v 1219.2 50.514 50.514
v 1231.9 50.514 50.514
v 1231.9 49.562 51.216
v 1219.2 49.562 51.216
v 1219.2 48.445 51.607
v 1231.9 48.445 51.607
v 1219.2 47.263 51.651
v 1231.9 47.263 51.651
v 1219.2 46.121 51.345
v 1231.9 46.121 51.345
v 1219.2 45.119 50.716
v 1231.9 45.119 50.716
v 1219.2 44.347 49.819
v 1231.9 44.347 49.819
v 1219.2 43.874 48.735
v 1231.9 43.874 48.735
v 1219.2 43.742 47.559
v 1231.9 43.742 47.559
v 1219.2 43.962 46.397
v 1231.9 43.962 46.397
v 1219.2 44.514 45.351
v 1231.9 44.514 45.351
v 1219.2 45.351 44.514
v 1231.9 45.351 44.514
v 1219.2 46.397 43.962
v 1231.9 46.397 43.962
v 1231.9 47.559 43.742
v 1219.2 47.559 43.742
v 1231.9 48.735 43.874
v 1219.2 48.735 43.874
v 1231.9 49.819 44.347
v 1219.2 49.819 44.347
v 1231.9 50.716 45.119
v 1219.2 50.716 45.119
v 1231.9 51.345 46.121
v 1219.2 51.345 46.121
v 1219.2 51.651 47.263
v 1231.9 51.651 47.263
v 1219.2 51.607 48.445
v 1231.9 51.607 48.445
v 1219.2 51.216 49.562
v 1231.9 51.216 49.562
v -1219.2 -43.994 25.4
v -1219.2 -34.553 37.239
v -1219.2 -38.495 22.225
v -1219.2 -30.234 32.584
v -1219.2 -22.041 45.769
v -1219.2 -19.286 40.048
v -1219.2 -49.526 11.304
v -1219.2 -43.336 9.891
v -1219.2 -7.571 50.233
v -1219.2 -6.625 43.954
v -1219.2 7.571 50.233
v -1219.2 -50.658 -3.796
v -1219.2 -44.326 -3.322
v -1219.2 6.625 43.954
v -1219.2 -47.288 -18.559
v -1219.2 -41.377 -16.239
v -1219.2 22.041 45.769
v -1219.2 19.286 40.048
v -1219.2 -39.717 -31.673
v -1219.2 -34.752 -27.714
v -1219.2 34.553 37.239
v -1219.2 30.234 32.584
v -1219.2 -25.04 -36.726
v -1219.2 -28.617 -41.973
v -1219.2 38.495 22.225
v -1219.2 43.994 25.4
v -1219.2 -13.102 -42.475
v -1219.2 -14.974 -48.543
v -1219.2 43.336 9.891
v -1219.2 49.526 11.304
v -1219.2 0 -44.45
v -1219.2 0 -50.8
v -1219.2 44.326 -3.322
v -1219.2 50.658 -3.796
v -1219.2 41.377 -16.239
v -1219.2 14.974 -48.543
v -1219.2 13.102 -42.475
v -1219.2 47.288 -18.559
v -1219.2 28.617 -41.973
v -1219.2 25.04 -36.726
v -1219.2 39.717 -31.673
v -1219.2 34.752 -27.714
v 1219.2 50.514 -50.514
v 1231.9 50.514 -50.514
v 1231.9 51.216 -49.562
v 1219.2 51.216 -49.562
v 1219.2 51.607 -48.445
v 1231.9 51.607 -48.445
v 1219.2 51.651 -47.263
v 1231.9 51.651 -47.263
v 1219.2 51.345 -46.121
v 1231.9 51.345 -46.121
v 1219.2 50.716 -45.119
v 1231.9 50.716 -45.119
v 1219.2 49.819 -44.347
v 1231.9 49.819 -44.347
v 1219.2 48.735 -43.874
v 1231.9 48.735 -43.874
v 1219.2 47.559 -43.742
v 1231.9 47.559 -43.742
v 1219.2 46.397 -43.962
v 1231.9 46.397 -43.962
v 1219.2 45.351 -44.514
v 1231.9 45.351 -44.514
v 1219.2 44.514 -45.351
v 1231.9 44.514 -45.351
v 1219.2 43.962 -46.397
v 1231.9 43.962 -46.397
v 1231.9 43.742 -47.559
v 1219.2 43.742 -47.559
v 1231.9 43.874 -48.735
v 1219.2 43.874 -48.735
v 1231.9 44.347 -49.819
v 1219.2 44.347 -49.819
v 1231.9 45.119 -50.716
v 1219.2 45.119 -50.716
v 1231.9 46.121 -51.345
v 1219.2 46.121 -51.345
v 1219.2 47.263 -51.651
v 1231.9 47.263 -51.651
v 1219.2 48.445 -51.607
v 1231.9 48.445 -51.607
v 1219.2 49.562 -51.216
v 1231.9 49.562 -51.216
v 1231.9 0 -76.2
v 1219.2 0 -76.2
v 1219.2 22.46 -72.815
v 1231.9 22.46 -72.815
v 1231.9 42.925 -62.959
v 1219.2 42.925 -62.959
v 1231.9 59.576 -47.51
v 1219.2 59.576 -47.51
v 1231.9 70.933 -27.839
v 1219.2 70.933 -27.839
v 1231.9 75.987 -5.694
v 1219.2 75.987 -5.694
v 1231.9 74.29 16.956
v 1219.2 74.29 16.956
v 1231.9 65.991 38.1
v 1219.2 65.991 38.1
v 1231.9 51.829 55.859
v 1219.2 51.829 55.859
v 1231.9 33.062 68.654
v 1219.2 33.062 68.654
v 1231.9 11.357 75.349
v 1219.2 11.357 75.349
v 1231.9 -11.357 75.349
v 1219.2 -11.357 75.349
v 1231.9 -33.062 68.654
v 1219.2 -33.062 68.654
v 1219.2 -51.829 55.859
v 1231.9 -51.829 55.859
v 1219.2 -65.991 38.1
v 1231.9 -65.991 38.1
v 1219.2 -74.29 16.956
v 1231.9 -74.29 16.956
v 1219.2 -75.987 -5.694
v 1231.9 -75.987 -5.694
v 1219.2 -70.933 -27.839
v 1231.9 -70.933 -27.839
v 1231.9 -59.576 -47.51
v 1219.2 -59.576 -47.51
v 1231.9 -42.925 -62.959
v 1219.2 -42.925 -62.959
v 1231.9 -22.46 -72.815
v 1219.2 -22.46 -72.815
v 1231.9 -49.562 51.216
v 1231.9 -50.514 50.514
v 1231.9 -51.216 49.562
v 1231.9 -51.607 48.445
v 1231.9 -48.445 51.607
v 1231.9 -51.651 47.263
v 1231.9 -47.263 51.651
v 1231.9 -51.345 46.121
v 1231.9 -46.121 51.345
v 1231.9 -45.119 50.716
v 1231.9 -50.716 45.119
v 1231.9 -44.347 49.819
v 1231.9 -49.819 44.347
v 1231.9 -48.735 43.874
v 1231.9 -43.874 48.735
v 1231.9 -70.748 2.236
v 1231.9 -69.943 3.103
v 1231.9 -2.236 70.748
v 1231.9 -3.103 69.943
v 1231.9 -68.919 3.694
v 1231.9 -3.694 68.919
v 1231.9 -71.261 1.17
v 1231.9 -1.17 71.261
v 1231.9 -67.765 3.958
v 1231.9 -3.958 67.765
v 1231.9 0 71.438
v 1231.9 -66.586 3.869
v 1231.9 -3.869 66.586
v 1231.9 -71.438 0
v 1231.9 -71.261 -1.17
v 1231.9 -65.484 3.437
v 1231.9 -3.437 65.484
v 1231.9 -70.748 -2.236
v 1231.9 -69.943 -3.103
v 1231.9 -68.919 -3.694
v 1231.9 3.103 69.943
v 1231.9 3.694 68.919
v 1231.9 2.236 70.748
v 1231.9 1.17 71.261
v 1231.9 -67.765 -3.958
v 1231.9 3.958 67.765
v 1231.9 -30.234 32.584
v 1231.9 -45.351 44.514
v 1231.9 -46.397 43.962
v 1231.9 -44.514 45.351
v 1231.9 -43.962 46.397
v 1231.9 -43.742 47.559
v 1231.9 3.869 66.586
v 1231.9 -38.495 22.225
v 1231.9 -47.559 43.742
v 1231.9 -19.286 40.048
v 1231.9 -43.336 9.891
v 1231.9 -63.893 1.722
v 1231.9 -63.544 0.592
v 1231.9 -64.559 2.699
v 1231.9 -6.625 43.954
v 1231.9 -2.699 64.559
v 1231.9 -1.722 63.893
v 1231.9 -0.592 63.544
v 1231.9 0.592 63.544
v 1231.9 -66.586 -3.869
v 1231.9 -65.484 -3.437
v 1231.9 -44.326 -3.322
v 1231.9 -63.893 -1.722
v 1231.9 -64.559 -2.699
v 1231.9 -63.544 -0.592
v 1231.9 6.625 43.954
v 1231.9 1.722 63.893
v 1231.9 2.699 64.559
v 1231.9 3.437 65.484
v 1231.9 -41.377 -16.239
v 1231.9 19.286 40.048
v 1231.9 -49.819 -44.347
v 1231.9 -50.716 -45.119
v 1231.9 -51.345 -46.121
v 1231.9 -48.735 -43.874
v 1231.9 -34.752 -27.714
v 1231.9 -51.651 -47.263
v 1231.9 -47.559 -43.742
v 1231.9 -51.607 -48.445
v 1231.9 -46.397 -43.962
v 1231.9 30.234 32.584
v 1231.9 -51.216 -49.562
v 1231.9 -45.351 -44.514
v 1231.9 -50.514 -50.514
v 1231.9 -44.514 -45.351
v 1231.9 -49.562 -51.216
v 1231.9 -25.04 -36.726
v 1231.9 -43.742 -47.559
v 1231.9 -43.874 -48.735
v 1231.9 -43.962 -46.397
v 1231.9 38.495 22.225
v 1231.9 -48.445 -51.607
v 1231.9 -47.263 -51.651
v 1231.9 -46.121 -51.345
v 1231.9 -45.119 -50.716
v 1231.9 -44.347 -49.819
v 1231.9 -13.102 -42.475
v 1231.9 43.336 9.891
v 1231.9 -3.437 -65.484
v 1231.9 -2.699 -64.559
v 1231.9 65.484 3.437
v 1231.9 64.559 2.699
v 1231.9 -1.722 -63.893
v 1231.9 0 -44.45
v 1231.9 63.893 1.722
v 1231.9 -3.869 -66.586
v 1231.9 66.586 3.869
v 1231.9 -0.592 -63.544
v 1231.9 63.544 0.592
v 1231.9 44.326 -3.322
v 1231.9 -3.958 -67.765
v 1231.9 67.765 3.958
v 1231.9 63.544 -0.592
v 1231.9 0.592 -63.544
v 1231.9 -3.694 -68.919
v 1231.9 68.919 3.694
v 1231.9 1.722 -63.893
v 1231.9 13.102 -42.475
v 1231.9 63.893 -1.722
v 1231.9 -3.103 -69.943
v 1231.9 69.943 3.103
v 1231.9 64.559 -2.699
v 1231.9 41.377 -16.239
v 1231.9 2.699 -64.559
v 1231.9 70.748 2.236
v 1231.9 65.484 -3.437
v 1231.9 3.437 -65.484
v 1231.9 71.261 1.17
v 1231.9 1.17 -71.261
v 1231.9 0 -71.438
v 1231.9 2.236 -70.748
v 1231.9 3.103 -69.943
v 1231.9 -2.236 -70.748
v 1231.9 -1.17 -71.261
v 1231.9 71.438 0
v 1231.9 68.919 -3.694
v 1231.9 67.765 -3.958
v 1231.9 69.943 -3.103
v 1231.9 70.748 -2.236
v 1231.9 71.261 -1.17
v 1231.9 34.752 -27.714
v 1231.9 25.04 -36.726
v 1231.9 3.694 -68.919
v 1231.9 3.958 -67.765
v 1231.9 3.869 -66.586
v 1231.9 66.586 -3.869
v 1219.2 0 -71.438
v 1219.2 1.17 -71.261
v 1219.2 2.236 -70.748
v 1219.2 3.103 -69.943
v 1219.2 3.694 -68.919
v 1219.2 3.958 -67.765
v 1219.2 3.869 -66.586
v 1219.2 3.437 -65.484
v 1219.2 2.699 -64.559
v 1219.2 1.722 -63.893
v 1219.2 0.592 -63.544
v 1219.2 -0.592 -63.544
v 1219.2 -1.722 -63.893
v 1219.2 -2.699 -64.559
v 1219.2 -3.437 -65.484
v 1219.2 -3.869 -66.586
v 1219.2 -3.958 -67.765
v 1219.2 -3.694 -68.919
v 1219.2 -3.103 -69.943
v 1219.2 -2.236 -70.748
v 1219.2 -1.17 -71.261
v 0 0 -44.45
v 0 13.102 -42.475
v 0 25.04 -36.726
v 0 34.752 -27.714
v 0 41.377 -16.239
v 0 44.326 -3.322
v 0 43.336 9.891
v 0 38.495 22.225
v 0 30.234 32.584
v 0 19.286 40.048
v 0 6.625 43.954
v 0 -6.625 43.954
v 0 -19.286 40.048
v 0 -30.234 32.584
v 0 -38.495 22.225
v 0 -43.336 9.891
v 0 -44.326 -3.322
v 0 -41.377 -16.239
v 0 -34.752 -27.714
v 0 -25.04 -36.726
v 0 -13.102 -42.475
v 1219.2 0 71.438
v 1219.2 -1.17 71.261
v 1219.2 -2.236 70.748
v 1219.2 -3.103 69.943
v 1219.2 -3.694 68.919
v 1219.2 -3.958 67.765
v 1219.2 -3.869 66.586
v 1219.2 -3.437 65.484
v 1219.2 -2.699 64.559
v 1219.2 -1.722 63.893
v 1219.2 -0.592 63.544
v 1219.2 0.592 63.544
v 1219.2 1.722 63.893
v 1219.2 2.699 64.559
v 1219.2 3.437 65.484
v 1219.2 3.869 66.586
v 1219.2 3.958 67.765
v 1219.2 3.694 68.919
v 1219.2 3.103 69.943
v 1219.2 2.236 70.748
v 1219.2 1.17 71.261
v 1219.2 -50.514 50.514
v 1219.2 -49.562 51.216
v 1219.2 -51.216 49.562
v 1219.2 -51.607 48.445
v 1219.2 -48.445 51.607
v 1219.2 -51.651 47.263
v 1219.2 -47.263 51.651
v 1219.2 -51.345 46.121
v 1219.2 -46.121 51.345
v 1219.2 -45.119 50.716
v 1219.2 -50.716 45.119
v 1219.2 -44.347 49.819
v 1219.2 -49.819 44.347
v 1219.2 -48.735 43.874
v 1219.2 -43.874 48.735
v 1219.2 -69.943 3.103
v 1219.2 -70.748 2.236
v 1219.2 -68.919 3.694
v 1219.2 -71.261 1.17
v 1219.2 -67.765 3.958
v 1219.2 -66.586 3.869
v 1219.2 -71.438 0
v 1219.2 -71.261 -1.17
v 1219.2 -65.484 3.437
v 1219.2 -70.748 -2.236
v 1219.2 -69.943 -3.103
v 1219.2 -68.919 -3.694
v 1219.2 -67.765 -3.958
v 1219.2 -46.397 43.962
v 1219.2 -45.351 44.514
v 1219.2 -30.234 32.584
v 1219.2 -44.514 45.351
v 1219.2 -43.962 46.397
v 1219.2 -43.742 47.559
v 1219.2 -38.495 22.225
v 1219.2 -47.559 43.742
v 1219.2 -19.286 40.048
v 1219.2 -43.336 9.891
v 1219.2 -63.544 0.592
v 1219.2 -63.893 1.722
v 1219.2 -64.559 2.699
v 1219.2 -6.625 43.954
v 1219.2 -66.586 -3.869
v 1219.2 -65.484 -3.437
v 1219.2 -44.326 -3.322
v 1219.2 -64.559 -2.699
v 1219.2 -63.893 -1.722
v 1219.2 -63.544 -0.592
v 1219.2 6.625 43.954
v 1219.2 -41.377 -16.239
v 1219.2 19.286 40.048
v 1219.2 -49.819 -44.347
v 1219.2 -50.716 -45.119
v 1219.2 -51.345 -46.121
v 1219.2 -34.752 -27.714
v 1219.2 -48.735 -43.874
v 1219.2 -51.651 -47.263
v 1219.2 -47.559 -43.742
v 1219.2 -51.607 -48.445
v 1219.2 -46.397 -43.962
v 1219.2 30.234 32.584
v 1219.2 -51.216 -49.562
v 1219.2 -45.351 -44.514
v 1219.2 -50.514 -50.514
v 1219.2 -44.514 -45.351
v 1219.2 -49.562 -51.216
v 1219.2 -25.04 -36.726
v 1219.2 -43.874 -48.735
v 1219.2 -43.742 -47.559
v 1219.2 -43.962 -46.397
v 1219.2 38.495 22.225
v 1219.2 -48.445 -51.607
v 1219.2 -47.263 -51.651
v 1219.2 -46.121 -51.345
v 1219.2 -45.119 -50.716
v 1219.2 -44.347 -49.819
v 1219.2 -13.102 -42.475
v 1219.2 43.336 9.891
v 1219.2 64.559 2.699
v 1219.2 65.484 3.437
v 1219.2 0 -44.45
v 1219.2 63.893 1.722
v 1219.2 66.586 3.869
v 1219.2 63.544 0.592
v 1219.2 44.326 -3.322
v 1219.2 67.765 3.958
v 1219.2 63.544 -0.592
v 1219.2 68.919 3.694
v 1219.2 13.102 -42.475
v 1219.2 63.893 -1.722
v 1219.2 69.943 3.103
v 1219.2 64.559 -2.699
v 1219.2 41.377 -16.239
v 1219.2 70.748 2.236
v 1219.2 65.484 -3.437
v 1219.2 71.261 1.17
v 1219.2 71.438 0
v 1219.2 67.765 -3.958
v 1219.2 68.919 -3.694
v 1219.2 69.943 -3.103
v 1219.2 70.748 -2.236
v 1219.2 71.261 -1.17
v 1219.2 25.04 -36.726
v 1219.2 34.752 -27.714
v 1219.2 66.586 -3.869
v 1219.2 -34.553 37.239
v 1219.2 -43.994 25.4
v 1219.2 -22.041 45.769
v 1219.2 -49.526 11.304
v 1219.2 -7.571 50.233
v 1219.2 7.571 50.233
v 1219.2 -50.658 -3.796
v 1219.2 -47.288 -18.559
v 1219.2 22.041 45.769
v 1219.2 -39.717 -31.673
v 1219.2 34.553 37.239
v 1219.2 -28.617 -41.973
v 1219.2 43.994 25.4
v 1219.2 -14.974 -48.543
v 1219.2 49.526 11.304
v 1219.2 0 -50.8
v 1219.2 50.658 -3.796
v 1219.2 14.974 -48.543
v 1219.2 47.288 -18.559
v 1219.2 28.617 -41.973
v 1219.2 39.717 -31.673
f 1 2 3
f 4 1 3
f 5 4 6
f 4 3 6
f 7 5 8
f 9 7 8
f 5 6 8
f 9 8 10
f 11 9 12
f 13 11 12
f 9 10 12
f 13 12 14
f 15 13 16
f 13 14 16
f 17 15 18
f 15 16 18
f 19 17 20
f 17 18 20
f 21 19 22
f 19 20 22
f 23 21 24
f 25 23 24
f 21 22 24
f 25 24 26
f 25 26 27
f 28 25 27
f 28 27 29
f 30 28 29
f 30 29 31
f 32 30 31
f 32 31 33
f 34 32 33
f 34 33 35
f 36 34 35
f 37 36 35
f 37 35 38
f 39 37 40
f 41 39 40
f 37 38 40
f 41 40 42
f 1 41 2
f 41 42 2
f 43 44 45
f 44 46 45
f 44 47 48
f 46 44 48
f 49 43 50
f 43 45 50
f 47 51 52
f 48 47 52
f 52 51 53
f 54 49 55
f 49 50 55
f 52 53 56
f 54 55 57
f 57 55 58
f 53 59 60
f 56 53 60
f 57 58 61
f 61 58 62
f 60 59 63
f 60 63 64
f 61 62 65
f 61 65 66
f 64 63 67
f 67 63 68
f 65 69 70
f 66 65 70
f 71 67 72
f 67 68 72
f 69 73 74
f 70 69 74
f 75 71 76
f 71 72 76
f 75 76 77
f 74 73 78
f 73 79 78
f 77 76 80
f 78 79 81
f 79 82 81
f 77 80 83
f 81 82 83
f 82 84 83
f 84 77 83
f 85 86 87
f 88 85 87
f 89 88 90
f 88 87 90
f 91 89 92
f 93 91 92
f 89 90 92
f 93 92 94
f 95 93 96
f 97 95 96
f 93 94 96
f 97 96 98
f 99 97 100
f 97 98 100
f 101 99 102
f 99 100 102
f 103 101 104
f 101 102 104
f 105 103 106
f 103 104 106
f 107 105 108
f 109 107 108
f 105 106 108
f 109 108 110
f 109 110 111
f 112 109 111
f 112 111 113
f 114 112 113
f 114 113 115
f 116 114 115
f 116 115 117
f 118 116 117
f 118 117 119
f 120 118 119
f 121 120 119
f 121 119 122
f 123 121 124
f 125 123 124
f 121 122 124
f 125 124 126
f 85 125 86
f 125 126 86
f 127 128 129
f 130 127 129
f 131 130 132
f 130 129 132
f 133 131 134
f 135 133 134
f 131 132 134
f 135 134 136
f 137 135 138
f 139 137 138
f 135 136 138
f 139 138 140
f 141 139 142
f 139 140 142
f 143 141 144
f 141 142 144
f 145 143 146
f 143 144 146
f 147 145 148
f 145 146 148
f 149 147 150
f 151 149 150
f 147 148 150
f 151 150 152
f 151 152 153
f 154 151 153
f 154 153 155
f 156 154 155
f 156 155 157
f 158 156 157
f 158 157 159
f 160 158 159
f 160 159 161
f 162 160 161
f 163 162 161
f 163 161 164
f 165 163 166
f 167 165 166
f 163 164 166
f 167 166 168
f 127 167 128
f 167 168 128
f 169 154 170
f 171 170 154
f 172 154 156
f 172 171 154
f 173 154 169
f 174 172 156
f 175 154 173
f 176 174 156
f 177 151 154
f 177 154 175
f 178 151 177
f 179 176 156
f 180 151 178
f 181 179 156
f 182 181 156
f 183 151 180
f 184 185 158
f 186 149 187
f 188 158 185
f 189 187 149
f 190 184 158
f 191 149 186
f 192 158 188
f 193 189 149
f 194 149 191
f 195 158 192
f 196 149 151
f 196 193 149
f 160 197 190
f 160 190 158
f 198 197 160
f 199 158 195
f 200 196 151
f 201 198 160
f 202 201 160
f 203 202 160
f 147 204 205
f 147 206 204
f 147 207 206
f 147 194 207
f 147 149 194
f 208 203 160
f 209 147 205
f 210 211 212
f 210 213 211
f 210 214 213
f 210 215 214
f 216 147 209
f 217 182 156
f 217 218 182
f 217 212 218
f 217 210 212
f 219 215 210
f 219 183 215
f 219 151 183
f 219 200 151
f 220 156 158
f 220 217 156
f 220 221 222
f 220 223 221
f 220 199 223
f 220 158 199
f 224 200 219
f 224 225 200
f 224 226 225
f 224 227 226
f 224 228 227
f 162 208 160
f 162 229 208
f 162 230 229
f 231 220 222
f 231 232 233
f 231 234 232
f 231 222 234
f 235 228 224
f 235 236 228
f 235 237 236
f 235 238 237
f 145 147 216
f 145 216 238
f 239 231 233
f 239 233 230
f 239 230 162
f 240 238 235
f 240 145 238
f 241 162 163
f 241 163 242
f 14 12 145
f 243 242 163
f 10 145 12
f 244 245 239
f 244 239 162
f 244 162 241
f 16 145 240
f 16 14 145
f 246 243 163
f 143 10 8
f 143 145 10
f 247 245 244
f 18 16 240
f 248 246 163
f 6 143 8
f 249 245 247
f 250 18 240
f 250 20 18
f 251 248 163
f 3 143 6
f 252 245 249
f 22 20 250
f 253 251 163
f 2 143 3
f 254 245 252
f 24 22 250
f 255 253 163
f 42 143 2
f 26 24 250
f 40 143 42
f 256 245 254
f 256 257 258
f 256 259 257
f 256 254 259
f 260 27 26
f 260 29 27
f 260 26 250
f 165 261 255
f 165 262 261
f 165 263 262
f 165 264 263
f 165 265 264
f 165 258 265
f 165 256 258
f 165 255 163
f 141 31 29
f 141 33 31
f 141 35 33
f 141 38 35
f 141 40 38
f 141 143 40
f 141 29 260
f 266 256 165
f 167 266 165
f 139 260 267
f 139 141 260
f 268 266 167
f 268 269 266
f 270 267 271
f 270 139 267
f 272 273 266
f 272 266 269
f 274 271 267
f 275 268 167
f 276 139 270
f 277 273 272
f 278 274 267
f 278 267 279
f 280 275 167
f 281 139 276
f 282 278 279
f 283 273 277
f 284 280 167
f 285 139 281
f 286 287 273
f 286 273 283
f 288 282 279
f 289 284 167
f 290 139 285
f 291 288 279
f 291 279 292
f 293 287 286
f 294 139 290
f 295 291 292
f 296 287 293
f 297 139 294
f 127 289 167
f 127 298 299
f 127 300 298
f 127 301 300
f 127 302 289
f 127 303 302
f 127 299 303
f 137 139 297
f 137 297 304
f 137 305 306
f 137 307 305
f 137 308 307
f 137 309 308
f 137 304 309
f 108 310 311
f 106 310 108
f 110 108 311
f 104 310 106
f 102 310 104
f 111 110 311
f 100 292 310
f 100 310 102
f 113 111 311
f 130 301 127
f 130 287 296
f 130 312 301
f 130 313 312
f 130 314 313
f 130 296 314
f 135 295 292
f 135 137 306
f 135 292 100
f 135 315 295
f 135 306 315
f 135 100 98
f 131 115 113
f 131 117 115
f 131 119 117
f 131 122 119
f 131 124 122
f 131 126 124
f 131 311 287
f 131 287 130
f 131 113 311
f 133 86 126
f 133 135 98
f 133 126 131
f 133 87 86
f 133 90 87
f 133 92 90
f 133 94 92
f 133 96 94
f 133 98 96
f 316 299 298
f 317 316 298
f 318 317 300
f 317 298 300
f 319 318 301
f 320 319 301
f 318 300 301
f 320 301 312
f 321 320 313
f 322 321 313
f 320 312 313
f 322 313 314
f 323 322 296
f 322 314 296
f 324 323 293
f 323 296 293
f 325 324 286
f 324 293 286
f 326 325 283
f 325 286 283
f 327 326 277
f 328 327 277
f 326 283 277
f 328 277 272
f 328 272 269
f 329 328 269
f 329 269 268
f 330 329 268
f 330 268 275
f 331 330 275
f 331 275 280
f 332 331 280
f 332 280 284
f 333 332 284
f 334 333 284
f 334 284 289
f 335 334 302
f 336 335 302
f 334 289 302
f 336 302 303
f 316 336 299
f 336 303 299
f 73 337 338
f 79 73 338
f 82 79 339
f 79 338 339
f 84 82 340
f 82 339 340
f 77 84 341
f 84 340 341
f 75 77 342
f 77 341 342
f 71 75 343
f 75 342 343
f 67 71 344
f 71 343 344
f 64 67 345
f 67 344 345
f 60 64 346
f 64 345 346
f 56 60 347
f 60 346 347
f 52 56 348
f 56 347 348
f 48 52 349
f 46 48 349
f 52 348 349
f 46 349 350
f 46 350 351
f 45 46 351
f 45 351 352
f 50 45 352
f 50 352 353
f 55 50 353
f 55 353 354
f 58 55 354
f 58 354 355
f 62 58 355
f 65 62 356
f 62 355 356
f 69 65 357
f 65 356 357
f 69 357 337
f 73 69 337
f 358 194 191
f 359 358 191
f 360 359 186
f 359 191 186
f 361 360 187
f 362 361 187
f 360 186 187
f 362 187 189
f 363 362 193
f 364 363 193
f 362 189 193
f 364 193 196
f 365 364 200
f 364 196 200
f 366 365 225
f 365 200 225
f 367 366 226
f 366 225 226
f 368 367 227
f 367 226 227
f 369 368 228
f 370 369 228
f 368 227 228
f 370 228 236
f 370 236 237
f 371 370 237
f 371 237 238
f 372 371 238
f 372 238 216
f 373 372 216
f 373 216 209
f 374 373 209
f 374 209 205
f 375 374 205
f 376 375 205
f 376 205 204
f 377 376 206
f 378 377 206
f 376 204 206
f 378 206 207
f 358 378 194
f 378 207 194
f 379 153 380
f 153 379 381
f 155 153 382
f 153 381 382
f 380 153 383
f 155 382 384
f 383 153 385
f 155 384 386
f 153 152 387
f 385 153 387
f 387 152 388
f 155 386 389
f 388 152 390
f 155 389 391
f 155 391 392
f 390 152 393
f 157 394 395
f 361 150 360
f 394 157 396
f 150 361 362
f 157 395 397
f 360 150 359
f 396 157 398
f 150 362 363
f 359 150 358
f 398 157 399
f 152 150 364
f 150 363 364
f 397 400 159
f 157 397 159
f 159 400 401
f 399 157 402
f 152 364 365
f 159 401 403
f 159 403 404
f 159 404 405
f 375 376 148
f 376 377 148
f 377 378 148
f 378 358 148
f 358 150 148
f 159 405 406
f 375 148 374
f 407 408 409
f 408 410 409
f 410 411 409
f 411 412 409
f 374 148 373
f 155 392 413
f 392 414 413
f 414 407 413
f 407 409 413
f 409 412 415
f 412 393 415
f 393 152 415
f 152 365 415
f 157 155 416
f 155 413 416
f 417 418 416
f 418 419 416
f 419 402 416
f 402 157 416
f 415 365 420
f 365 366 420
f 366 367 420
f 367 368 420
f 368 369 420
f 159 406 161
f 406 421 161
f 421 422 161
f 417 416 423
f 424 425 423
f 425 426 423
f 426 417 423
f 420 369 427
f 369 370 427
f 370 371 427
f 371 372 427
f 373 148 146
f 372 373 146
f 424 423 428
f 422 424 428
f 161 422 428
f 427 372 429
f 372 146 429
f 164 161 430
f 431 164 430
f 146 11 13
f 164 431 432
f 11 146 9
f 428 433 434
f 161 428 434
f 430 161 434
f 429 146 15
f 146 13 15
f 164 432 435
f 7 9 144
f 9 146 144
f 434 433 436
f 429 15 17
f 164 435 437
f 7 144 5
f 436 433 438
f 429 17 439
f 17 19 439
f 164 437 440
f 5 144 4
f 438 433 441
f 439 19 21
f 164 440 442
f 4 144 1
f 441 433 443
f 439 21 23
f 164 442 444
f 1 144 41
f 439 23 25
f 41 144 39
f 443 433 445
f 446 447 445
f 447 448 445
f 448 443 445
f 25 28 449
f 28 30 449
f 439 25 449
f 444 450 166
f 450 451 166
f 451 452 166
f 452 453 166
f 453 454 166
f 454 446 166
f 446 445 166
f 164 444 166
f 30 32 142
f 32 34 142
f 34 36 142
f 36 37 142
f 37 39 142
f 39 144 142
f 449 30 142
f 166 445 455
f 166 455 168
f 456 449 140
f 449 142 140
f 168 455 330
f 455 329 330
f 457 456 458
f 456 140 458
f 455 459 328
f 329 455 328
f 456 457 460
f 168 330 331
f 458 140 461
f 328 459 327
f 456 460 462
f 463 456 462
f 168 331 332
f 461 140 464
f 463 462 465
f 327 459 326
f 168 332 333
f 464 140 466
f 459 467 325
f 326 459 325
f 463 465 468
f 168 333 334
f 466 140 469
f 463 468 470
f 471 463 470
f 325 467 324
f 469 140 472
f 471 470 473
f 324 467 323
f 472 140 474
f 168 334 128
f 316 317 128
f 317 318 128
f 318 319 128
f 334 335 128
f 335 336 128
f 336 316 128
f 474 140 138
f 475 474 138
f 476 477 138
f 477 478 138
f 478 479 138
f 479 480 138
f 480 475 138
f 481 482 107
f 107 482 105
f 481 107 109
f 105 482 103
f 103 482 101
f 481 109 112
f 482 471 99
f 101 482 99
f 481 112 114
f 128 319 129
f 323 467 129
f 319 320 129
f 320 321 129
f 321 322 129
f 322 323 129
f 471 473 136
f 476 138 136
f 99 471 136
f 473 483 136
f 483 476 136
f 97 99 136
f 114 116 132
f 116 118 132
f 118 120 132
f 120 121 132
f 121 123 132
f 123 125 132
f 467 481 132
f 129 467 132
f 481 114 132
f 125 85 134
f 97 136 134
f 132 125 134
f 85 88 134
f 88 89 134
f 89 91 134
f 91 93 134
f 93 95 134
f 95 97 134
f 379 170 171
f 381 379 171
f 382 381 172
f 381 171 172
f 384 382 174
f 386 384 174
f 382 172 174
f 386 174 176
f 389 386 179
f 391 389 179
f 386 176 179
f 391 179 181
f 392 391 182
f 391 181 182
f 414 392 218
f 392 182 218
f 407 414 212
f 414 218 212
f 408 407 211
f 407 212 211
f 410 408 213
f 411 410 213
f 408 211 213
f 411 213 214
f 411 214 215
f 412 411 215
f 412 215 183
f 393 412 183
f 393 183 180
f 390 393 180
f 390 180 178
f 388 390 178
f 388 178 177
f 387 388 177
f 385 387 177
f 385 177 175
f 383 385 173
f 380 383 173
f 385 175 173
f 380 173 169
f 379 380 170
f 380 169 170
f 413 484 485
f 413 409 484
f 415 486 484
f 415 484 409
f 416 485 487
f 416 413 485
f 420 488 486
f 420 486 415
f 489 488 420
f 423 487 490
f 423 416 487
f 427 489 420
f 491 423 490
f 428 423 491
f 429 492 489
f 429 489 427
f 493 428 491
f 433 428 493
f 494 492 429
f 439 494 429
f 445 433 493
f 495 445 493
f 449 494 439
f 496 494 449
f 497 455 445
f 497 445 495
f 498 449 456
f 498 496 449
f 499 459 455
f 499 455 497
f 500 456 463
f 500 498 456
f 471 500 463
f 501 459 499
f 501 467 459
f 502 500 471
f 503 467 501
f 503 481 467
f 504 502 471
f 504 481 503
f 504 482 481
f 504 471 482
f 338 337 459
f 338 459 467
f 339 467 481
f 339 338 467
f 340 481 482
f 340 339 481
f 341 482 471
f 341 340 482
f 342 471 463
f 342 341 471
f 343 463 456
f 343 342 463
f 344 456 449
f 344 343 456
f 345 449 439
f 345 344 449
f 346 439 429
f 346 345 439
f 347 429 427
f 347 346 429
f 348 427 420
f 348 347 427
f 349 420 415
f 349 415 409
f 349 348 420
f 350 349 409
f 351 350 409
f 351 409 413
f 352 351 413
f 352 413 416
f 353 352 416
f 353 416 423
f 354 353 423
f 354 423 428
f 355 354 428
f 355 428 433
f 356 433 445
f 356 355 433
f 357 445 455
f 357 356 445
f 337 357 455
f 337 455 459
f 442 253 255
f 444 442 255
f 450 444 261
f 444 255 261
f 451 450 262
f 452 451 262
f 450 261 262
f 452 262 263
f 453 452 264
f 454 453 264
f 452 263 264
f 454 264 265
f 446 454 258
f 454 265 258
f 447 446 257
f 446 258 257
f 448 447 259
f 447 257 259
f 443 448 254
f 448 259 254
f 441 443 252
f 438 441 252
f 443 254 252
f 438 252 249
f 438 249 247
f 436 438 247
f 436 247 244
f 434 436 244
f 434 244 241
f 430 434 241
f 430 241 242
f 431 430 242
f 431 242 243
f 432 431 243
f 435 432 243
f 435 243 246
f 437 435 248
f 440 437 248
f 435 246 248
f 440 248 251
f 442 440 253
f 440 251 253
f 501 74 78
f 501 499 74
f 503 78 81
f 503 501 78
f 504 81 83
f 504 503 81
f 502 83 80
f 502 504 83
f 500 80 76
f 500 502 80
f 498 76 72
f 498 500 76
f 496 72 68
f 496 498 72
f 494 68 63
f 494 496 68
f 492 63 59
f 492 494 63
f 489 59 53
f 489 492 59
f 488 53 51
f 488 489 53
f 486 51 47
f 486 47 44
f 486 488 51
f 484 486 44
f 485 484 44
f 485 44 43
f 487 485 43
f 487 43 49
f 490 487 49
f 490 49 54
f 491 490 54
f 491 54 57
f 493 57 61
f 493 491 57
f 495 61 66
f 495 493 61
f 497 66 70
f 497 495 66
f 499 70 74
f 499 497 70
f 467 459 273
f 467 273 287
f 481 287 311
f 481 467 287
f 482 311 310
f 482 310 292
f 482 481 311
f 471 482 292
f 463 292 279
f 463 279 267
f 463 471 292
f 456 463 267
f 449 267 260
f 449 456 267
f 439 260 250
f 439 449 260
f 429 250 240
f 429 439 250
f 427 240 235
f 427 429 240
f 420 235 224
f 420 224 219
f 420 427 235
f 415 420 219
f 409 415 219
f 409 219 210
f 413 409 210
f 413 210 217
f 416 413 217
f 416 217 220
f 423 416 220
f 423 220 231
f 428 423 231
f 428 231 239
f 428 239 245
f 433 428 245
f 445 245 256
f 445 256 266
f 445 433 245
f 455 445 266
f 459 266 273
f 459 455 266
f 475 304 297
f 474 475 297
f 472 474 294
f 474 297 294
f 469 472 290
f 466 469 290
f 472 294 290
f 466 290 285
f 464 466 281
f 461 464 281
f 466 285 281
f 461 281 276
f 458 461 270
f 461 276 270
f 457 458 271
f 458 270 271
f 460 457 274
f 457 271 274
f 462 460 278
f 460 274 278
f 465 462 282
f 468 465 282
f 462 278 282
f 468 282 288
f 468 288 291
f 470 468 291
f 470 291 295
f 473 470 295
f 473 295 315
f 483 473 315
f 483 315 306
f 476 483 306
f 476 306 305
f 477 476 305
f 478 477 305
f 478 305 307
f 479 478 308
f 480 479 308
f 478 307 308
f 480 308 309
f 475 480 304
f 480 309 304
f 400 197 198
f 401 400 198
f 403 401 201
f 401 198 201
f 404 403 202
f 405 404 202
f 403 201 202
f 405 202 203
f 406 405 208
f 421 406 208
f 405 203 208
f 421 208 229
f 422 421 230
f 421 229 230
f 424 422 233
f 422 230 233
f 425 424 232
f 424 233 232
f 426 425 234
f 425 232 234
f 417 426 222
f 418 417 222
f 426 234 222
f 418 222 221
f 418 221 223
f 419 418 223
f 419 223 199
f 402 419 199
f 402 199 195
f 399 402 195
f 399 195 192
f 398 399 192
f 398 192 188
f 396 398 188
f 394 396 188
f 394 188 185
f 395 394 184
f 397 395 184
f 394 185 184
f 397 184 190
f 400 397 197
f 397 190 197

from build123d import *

# Parameters (mm, degrees)
BOSS_EXTRUDE1_DEPTH      = 1219.2
BOSS_EXTRUDE1_DEPTH_BACK = 1219.2
SKETCH1_R                = 50.8
SKETCH1_R_2              = 44.45
SKETCH2_R                = 76.2
SKETCH2_R_2              = 44.45
BOSS_EXTRUDE2_DEPTH      = 12.7
SKETCH3_R                = 3.96875
CUT_EXTRUDE1_DEPTH       = 12.7
CIRPATTERN1_COUNT        = 8


with BuildPart() as part:
    # Sketch1 → Boss-Extrude1 (new, two sides: drawn at the far end of the back side and taken through both)
    with BuildSketch(Plane(origin=(0, 0, 0), x_dir=(0, 0, -1), z_dir=(1, 0, 0)).offset(-BOSS_EXTRUDE1_DEPTH_BACK)):
        Circle(SKETCH1_R)
        Circle(SKETCH1_R_2, mode=Mode.SUBTRACT)
    extrude(amount=BOSS_EXTRUDE1_DEPTH + BOSS_EXTRUDE1_DEPTH_BACK)


with BuildPart() as body_2:
    # Sketch2 → Boss-Extrude2 (new body)
    with BuildSketch(Plane(origin=(1219.2, 0, 0), x_dir=(0, 0, -1), z_dir=(1, 0, 0))):
        Circle(SKETCH2_R)
        Circle(SKETCH2_R_2, mode=Mode.SUBTRACT)
    extrude(amount=BOSS_EXTRUDE2_DEPTH)

    # Sketch3 → Cut-Extrude1 (cut)
    with BuildSketch(Plane(origin=(1231.9, 0, 0), x_dir=(0, 0, -1), z_dir=(1, 0, 0))):
        with Locations((67.46875, 0)):
            Circle(SKETCH3_R)
    cut_extrude1 = extrude(amount=-CUT_EXTRUDE1_DEPTH, mode=Mode.SUBTRACT)

    # CirPattern1: Cut-Extrude1 ×8 about axis
    cirpattern1_axis = Axis((1231.9, 0, 0), (1, 0, 0))
    for i in range(1, CIRPATTERN1_COUNT):
        add(cut_extrude1.rotate(cirpattern1_axis, i * 360 / CIRPATTERN1_COUNT), mode=Mode.SUBTRACT)


solid = Compound([part.part, body_2.part])
